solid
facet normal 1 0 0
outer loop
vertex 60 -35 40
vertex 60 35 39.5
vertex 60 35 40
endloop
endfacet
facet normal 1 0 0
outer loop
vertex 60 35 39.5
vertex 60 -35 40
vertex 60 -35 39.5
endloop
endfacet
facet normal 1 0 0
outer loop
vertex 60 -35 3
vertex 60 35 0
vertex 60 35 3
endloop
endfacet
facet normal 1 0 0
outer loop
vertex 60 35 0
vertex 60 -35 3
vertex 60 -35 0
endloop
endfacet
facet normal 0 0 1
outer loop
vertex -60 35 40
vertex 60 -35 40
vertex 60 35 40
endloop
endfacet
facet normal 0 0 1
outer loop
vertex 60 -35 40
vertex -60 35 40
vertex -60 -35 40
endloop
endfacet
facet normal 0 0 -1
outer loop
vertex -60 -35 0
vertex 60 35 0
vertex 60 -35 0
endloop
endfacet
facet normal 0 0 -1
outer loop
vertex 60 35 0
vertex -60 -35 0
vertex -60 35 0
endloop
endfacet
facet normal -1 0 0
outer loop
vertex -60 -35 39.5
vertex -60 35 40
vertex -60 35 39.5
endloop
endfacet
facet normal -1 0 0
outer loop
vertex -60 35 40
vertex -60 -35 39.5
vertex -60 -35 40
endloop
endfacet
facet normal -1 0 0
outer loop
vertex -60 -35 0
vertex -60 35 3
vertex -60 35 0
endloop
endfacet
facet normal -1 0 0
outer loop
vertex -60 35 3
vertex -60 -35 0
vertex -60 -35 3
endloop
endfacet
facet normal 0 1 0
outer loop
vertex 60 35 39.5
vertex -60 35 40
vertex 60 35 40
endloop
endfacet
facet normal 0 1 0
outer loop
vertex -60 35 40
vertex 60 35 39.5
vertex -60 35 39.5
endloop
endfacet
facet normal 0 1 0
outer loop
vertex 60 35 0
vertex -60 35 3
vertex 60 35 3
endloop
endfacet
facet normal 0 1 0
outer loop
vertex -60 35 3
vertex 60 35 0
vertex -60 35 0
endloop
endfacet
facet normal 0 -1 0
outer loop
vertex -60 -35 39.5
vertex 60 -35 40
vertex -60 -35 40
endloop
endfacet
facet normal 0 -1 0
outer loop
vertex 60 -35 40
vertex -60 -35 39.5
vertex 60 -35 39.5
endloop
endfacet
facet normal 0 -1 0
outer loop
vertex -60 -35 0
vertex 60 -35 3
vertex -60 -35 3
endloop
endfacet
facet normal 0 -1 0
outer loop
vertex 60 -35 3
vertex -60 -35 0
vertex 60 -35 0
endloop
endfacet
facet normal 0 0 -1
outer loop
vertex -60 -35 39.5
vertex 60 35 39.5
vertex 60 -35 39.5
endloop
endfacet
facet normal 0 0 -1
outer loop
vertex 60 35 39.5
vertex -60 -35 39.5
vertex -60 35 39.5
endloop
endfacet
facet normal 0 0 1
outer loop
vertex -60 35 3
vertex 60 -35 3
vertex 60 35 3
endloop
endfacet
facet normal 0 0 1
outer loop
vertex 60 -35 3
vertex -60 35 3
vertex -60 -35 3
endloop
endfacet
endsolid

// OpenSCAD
// Mini horizontal gel-electrophoresis box - buffer tank
// Print orientation: tank bottom on XY plane, opening upward (+Z)

// ---------------- Parameters ----------------
outer_x      = 120;   // outer tank length (X)
outer_y      = 70;    // outer tank width (Y)
tank_h       = 40;    // overall tank height (Z)
wall         = 3;     // wall thickness
floor        = 3;     // floor thickness (solid bottom)

platform_len = 60;    // gel tray platform length (X)
platform_h   = 10;    // platform height above inner floor (z = 13)
platform_y   = outer_y - 2*wall;  // platform spans full inner width

hole_d       = 2;     // electrode wire hole diameter
hole_z       = 30;    // hole height (through end walls)
hole_y       = 0;     // hole Y position

eps          = 0.5;   // cutter overshoot past faces
$fn          = 96;    // curve resolution

// ---------------- Model ----------------
difference() {
    // Tank body
    translate([-outer_x/2, -outer_y/2, 0])
        cube([outer_x, outer_y, tank_h]);

    // Open top (hollow out above floor)
    translate([-outer_x/2, -outer_y/2, floor])
        cube([outer_x, outer_y, tank_h - floor - eps]);

    // Gel tray platform
    translate([-platform_len/2, -platform_y/2, floor])
        cube([platform_len, platform_y, platform_h + eps]);

    // Electrode holes through end walls
    for (sx = [-1, 1])
        translate([sx * (outer_x/2 - eps), hole_y, hole_z])
            rotate([90, 0, 0])
                cylinder(d = hole_d, h = outer_y + 2*eps);
}
